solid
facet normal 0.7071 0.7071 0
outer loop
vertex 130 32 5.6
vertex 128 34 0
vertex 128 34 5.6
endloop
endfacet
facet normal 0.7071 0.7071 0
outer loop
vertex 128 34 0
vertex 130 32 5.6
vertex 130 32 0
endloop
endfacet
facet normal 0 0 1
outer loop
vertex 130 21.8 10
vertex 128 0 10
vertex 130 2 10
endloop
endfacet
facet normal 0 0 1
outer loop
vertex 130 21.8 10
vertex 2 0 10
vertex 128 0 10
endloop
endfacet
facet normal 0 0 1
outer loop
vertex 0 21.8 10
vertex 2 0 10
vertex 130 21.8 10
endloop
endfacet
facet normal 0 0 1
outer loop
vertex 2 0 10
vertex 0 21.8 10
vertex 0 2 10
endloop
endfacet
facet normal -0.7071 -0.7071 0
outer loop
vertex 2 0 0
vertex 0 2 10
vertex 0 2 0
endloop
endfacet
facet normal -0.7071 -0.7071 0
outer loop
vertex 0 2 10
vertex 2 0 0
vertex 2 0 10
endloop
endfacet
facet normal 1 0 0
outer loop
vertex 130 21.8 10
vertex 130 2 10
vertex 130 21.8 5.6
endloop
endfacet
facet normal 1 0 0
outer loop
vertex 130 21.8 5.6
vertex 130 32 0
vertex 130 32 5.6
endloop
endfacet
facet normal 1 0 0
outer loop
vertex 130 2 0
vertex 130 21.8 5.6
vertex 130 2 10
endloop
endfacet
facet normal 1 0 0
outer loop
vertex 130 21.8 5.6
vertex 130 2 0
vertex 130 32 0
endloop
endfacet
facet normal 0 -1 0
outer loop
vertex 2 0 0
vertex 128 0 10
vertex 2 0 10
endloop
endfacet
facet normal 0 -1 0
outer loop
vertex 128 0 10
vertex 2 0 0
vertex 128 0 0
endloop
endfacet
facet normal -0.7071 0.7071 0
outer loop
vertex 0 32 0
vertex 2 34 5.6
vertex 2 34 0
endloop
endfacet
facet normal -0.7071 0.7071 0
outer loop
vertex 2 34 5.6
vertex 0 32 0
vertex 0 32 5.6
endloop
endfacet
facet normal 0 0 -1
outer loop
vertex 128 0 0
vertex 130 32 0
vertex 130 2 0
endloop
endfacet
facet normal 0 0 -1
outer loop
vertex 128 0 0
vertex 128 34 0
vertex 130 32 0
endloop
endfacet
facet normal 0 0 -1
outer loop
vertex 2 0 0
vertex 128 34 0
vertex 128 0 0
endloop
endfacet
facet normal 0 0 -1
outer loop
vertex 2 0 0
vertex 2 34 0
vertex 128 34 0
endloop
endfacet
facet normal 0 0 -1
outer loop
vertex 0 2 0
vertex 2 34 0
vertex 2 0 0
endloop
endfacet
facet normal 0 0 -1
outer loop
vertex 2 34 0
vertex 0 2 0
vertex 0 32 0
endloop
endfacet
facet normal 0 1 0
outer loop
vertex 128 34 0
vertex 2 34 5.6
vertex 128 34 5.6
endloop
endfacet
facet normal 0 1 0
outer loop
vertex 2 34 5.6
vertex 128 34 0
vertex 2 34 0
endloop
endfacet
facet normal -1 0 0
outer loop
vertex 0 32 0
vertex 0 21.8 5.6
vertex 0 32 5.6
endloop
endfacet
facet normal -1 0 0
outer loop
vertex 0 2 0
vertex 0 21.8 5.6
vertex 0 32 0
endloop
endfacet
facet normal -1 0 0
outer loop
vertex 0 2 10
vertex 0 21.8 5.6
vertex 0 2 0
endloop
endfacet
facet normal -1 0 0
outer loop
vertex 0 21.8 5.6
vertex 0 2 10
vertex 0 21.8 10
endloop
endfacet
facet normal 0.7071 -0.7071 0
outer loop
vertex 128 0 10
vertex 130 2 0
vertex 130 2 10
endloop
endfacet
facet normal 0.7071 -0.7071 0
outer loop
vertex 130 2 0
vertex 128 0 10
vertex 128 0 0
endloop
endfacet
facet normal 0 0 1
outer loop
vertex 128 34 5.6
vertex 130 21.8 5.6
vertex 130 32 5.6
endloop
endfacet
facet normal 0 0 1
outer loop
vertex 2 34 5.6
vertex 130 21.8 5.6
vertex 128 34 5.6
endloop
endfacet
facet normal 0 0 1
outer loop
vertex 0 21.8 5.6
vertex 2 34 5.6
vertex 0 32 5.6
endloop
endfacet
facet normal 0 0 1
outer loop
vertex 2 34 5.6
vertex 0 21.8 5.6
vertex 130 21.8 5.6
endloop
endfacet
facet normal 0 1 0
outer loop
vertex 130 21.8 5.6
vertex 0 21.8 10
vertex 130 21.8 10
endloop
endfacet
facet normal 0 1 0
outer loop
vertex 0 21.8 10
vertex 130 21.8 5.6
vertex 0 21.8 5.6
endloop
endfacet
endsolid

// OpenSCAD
$fn = 32;

// ----------------------------------------------------------------------
// Stepped bar: sidestep, 130 x 34 x 10/5.6 mm
// ----------------------------------------------------------------------

// --- parameters (mm) ---
bar_l = 130;              // bar length, X
bar_w = 34;               // bar width, Y
plate_t = 10;             // thickness of the thick zone, Z
thin_t = 5.6;             // thickness of the thin zone
corner_c = 2;             // corner chamfer of the bar
step_cut = 4.4;           // material removed from the thin zone
ledge_y = 21.8;           // start of the ledge from the front edge
depth_1 = 4.4;            // depth of cut 1 from the top face

profile = [[2, 0], [128, 0], [130, 2], [130, 32], [128, 34], [2, 34], [0, 32], [0, 2]];  // primary outline, 8 points, counter clockwise
void_1 = [[-1, 21.8], [131, 21.8], [131, 35], [-1, 35]];  // ledge cut along one edge, 4 points

// --- the one profile operation ---
difference() {
  linear_extrude(height = plate_t) polygon(points = profile);
  translate([0, 0, plate_t - depth_1])
    linear_extrude(height = depth_1 + 1) polygon(points = void_1);
}
